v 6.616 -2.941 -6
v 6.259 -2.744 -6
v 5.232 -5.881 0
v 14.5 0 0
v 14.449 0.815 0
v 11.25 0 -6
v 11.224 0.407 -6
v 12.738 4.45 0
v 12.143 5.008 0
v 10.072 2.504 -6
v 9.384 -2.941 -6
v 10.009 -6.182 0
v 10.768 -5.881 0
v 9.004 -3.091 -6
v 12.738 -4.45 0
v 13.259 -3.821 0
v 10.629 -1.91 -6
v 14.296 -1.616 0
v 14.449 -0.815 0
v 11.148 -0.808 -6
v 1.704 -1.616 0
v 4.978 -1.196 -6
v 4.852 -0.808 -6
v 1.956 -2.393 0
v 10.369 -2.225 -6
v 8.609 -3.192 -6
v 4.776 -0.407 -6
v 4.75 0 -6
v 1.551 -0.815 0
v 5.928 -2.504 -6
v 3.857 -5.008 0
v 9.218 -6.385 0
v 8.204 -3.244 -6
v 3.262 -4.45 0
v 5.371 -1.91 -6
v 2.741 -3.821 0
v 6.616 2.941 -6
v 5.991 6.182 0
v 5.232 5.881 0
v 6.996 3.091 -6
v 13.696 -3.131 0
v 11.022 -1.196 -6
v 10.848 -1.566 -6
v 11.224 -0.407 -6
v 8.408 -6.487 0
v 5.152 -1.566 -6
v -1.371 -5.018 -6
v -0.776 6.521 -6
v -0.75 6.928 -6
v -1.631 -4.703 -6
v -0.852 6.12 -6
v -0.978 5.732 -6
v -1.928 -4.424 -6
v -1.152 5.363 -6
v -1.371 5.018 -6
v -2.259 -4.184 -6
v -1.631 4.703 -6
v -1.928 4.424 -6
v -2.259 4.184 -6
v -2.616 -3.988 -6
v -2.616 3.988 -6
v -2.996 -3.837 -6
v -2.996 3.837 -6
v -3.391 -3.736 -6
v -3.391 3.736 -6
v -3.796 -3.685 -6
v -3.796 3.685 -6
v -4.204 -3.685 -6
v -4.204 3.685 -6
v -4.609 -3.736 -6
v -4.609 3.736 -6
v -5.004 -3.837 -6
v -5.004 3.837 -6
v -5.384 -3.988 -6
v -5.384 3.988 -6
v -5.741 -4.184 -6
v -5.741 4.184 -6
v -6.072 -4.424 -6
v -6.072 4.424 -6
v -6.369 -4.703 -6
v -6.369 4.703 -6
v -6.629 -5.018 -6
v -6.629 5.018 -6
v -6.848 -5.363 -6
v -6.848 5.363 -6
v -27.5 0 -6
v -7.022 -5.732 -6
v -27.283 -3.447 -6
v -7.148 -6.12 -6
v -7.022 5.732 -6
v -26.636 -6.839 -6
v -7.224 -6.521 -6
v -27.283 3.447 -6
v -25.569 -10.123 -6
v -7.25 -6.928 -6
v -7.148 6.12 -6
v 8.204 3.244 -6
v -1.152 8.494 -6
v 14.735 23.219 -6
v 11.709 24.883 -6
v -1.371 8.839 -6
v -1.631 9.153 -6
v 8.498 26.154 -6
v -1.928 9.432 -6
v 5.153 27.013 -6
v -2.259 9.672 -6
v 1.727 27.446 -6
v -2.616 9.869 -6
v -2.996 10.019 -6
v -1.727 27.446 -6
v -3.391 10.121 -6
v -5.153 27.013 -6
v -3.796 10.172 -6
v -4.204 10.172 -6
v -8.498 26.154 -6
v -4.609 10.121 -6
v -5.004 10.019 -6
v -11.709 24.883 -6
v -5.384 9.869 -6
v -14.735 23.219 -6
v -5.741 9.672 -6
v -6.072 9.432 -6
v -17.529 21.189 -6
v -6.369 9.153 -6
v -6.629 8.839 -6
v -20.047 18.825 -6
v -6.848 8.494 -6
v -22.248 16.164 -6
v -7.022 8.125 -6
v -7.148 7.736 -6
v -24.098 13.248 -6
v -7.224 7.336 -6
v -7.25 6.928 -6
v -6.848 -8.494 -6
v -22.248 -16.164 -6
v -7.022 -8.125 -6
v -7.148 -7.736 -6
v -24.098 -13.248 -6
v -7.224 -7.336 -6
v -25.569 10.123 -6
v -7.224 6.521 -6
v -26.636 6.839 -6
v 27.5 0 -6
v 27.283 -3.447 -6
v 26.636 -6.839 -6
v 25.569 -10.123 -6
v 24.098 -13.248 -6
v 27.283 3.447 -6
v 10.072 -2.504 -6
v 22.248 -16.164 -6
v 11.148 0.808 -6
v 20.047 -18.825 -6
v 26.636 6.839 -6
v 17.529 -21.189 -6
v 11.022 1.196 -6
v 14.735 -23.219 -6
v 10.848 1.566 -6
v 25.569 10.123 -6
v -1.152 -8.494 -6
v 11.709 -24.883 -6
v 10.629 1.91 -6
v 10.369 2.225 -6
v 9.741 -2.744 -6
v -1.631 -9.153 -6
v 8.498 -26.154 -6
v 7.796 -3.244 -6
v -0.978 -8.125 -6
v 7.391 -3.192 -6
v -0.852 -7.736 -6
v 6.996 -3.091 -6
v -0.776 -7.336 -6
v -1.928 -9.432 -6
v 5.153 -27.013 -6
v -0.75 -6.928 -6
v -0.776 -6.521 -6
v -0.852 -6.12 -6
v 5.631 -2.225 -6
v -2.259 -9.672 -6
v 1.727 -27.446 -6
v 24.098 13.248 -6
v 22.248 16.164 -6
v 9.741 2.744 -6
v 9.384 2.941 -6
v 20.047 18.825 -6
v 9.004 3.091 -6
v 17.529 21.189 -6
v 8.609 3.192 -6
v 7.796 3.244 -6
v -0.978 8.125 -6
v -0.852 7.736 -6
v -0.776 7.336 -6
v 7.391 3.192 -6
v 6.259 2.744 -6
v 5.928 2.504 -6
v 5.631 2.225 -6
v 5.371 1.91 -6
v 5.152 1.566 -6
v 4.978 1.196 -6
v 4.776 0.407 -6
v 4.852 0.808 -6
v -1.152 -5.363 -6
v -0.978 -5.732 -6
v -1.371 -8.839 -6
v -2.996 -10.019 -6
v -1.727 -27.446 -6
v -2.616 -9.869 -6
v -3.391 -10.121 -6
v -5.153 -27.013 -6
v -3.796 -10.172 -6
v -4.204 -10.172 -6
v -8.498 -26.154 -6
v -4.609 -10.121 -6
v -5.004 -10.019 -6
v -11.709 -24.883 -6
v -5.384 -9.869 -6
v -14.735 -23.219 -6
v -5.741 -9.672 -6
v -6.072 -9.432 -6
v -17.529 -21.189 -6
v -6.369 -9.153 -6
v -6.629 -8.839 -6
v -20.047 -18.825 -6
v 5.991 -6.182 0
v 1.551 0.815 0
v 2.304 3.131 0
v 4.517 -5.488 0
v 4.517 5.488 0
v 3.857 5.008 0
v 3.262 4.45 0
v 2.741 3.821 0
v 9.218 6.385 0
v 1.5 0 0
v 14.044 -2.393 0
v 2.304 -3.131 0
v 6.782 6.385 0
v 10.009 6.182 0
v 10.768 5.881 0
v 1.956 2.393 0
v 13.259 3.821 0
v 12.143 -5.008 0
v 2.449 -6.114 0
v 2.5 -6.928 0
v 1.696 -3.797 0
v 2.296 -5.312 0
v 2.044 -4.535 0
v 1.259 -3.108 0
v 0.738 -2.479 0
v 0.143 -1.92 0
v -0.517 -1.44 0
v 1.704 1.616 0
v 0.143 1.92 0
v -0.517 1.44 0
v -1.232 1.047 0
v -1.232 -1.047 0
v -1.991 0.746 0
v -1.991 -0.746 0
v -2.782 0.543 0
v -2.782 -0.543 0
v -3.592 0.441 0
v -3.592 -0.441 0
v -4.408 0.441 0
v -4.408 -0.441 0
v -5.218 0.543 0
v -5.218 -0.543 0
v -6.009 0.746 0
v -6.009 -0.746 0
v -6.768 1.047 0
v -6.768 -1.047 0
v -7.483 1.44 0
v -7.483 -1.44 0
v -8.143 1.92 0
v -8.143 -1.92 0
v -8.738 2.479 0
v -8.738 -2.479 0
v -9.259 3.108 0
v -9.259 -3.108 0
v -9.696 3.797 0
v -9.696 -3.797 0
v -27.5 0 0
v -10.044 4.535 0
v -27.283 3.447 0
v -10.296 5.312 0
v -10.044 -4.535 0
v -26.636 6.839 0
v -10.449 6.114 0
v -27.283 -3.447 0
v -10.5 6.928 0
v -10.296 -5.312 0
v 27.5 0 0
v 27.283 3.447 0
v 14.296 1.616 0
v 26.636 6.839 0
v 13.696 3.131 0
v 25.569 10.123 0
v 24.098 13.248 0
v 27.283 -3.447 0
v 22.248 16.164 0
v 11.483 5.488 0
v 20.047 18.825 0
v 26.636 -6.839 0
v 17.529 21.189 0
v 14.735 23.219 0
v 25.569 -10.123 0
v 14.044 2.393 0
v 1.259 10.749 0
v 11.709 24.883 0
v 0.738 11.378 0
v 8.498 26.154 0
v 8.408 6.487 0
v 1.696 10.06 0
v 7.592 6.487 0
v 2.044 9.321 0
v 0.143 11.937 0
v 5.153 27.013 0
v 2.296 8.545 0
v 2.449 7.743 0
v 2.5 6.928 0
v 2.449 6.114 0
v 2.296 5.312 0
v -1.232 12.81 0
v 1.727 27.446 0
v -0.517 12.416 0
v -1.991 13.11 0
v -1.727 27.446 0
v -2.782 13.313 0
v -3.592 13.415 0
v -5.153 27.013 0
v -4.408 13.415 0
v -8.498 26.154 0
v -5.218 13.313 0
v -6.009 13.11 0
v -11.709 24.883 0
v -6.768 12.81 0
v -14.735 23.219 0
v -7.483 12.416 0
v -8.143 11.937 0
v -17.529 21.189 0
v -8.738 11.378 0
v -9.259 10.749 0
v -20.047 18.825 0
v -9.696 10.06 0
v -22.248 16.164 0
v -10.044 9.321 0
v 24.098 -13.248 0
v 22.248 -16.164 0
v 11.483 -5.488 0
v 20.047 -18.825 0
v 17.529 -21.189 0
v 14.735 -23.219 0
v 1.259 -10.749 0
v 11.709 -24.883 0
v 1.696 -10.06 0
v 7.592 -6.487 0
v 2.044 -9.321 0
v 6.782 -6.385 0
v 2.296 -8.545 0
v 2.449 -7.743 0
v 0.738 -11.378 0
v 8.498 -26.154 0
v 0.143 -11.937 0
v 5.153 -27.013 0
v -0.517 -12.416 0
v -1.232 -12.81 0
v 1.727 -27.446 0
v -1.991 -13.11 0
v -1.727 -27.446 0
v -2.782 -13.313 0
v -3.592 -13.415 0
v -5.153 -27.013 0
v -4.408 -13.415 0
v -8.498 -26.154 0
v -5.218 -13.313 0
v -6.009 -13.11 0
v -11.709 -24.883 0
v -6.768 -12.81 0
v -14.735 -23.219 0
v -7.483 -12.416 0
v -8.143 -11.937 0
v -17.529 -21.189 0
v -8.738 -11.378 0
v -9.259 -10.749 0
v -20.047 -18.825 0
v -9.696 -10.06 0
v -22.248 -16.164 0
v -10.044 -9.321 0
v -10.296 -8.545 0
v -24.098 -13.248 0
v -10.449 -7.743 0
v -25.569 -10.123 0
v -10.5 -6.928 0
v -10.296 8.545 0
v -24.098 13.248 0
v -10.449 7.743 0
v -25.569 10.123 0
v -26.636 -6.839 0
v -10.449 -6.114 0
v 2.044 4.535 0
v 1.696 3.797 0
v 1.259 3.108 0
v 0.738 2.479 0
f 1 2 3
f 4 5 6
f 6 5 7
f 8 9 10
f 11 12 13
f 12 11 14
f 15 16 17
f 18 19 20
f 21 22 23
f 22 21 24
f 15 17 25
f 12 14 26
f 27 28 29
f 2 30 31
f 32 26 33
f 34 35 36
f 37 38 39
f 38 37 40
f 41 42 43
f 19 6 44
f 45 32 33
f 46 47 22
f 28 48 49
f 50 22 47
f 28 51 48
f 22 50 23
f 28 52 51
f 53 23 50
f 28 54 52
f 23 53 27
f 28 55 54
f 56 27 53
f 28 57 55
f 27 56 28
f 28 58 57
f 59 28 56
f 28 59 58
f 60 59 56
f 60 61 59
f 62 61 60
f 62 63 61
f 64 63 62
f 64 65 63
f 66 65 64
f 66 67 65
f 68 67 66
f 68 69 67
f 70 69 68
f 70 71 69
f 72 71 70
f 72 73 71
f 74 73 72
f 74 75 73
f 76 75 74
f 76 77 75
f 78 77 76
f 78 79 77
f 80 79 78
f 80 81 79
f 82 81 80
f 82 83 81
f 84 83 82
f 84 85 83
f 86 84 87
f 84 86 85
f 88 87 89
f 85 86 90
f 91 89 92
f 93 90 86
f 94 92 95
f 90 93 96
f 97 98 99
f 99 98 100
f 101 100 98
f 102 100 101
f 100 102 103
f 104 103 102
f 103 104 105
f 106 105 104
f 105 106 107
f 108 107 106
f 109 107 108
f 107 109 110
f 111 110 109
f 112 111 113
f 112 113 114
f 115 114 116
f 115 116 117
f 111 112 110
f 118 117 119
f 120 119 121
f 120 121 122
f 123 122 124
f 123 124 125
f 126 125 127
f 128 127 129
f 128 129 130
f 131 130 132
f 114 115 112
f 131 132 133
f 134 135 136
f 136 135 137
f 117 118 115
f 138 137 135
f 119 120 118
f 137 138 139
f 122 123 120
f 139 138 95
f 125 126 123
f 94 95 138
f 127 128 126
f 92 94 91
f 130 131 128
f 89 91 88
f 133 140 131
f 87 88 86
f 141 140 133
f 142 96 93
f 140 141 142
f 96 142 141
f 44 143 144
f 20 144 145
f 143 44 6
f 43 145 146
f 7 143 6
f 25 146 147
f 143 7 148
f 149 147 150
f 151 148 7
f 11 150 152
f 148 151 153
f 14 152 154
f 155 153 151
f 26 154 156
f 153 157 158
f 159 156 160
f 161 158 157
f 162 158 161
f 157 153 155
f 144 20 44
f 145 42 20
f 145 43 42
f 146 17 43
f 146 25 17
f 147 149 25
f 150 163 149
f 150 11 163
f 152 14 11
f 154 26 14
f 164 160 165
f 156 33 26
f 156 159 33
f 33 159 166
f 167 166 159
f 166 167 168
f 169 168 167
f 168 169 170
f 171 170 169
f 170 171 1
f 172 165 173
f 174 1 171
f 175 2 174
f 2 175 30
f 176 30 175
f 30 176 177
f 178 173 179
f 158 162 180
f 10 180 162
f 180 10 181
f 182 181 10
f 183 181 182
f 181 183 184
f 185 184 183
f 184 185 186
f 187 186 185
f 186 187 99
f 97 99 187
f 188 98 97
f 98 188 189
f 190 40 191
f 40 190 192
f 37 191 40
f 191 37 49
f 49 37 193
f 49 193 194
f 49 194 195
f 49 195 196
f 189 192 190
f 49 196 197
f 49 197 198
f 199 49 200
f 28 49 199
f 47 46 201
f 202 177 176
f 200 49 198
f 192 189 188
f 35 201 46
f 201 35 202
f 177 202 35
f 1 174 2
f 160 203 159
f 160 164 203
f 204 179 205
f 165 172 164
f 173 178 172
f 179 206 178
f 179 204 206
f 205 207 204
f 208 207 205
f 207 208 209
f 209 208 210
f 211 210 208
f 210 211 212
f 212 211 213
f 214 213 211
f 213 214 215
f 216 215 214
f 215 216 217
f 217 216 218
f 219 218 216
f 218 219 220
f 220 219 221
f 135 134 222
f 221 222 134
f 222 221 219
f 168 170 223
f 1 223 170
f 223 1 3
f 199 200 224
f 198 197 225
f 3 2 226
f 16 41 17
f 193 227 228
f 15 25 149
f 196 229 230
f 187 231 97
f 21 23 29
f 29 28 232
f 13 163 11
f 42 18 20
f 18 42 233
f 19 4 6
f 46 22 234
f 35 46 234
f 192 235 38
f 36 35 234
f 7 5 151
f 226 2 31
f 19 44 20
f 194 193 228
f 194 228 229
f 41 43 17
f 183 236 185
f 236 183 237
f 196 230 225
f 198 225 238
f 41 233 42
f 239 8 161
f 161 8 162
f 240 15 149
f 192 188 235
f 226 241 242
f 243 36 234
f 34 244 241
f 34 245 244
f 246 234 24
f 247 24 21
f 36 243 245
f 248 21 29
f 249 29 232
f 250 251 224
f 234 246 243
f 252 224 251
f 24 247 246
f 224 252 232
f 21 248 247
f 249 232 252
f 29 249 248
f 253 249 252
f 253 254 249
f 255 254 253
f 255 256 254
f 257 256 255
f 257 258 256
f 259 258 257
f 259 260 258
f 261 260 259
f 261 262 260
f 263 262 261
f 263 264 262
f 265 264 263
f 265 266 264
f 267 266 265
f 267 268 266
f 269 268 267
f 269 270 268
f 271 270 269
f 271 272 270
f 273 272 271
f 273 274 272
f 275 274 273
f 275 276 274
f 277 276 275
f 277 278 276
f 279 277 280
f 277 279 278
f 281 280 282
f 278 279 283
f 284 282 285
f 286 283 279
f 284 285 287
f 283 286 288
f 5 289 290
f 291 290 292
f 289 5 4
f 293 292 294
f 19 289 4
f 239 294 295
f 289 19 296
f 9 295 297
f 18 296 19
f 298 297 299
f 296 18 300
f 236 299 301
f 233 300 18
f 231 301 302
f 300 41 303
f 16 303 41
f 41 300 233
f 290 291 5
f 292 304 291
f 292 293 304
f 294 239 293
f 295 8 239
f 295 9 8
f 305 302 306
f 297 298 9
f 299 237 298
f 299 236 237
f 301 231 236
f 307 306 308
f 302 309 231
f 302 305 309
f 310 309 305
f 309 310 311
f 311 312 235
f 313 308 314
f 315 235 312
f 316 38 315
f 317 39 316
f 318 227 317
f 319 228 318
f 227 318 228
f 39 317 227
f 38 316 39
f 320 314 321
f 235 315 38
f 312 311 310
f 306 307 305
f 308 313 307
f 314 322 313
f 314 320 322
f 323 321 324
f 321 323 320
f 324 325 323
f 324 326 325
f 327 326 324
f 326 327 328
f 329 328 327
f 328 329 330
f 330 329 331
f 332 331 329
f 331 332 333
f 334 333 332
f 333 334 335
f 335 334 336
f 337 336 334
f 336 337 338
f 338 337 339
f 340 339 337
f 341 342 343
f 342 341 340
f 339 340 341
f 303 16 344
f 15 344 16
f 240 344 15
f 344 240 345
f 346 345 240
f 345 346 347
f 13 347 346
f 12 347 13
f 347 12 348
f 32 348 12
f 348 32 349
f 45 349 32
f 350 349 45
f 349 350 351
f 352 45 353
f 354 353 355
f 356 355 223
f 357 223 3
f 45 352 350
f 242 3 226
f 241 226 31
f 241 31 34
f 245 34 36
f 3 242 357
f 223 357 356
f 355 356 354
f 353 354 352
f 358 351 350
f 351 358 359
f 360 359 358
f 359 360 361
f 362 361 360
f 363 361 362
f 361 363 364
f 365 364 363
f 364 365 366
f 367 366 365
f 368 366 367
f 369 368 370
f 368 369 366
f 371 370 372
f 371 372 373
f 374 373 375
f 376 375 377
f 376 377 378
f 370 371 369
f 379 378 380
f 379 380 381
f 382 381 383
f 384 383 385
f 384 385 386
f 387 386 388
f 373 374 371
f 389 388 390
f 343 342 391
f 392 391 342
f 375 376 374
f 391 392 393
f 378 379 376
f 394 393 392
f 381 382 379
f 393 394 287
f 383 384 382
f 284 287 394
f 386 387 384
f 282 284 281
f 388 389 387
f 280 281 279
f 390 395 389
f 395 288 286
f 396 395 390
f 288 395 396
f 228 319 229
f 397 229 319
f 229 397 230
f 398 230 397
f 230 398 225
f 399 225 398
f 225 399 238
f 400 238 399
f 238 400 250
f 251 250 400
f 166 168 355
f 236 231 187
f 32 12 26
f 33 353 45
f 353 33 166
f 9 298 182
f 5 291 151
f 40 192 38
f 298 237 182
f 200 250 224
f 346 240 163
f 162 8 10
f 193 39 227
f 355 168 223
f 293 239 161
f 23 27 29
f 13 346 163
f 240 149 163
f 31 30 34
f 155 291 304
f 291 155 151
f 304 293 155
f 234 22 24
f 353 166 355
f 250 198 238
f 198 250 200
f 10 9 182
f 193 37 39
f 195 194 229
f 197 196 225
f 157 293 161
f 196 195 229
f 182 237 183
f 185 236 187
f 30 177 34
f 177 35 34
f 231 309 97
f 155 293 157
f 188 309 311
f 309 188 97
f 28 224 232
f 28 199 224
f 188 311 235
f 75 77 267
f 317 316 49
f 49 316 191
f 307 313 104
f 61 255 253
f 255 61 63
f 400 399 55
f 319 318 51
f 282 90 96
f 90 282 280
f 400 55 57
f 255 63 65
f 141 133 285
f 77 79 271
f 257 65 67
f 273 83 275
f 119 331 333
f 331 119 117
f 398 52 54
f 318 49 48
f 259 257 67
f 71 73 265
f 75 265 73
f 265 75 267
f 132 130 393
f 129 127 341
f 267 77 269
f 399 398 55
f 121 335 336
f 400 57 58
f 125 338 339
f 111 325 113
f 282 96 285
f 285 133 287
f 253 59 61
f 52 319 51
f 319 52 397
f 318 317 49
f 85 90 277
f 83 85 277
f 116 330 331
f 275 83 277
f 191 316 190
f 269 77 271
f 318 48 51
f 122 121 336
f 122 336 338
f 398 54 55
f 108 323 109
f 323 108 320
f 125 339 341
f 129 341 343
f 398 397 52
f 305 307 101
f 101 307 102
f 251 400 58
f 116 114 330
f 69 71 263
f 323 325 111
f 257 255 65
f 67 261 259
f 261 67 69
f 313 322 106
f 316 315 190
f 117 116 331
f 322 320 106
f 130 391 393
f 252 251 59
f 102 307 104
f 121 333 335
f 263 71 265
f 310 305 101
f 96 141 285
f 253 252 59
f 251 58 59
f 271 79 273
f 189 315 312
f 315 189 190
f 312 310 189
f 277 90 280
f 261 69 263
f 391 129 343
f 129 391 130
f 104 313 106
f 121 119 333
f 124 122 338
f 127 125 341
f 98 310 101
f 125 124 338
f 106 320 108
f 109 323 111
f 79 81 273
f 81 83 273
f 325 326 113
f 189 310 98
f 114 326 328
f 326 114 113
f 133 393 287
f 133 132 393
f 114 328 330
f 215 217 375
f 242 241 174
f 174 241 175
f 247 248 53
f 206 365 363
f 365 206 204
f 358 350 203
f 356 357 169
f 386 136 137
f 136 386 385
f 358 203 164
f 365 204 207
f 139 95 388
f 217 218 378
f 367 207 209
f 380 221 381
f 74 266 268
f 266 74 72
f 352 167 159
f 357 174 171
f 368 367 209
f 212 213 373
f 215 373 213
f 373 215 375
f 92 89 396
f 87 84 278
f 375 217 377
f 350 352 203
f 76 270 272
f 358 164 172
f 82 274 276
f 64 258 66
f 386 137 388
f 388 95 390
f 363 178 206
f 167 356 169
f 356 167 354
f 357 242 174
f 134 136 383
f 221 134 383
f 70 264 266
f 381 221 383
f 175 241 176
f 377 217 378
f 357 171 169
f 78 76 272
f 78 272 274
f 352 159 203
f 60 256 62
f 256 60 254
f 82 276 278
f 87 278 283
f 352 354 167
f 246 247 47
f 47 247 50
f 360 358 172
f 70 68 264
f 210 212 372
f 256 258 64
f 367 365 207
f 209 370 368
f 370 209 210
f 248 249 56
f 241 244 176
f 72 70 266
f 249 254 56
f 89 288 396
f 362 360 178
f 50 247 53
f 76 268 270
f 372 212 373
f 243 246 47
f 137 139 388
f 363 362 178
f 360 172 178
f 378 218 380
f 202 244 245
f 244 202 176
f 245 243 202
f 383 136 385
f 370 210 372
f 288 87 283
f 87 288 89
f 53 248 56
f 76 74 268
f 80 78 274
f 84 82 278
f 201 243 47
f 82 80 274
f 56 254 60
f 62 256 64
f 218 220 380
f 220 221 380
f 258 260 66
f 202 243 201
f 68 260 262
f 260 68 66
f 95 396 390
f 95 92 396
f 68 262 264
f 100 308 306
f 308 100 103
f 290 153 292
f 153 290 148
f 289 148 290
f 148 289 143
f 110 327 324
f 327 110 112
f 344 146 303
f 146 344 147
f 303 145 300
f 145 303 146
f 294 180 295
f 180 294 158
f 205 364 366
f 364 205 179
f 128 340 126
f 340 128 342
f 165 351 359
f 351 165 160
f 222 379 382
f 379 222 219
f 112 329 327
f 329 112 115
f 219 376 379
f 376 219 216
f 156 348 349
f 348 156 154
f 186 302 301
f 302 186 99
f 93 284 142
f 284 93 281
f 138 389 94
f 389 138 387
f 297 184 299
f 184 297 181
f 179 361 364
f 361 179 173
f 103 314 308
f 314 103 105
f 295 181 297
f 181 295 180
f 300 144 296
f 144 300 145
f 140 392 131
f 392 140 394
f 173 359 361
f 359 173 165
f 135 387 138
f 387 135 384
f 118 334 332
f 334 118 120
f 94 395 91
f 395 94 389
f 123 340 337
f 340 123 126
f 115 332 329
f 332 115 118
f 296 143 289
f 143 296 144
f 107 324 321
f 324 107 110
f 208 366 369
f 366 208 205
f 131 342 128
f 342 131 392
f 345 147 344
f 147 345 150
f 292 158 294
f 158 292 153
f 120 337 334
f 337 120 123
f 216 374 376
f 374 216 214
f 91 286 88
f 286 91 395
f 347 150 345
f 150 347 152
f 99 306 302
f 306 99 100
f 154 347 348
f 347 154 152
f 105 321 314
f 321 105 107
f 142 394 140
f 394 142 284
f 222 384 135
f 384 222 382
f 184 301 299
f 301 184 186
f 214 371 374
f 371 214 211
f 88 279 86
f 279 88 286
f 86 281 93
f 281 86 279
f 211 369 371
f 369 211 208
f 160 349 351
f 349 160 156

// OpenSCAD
$fn = 50;


difference() {
	union() {
		cylinder(h = 0, r = 12.5000000000);
		translate(v = [0, 0, -6.0000000000]) {
			cylinder(h = 6, r = 27.5000000000);
		}
	}
	union() {
		translate(v = [8.0000000000, 0.0000000000, 0]) {
			rotate(a = [0, 0, 0]) {
				difference() {
					union() {
						#cylinder(h = 0, r = 2.2500000000);
						#translate(v = [0, 0, -6]) {
							cylinder(h = 6, r = 12.5000000000, r1 = 3.2500000000, r2 = 6.5000000000);
						}
						#cylinder(h = 0, r = 3.2500000000);
						#cylinder(h = 0, r = 2.2500000000);
					}
					union();
				}
			}
		}
		translate(v = [-4.0000000000, 6.9282032303, 0]) {
			rotate(a = [0, 0, 0]) {
				difference() {
					union() {
						#cylinder(h = 0, r = 2.2500000000);
						#translate(v = [0, 0, -6]) {
							cylinder(h = 6, r = 12.5000000000, r1 = 3.2500000000, r2 = 6.5000000000);
						}
						#cylinder(h = 0, r = 3.2500000000);
						#cylinder(h = 0, r = 2.2500000000);
					}
					union();
				}
			}
		}
		translate(v = [-4.0000000000, -6.9282032303, 0]) {
			rotate(a = [0, 0, 0]) {
				difference() {
					union() {
						#cylinder(h = 0, r = 2.2500000000);
						#translate(v = [0, 0, -6]) {
							cylinder(h = 6, r = 12.5000000000, r1 = 3.2500000000, r2 = 6.5000000000);
						}
						#cylinder(h = 0, r = 3.2500000000);
						#cylinder(h = 0, r = 2.2500000000);
					}
					union();
				}
			}
		}
	}
}
